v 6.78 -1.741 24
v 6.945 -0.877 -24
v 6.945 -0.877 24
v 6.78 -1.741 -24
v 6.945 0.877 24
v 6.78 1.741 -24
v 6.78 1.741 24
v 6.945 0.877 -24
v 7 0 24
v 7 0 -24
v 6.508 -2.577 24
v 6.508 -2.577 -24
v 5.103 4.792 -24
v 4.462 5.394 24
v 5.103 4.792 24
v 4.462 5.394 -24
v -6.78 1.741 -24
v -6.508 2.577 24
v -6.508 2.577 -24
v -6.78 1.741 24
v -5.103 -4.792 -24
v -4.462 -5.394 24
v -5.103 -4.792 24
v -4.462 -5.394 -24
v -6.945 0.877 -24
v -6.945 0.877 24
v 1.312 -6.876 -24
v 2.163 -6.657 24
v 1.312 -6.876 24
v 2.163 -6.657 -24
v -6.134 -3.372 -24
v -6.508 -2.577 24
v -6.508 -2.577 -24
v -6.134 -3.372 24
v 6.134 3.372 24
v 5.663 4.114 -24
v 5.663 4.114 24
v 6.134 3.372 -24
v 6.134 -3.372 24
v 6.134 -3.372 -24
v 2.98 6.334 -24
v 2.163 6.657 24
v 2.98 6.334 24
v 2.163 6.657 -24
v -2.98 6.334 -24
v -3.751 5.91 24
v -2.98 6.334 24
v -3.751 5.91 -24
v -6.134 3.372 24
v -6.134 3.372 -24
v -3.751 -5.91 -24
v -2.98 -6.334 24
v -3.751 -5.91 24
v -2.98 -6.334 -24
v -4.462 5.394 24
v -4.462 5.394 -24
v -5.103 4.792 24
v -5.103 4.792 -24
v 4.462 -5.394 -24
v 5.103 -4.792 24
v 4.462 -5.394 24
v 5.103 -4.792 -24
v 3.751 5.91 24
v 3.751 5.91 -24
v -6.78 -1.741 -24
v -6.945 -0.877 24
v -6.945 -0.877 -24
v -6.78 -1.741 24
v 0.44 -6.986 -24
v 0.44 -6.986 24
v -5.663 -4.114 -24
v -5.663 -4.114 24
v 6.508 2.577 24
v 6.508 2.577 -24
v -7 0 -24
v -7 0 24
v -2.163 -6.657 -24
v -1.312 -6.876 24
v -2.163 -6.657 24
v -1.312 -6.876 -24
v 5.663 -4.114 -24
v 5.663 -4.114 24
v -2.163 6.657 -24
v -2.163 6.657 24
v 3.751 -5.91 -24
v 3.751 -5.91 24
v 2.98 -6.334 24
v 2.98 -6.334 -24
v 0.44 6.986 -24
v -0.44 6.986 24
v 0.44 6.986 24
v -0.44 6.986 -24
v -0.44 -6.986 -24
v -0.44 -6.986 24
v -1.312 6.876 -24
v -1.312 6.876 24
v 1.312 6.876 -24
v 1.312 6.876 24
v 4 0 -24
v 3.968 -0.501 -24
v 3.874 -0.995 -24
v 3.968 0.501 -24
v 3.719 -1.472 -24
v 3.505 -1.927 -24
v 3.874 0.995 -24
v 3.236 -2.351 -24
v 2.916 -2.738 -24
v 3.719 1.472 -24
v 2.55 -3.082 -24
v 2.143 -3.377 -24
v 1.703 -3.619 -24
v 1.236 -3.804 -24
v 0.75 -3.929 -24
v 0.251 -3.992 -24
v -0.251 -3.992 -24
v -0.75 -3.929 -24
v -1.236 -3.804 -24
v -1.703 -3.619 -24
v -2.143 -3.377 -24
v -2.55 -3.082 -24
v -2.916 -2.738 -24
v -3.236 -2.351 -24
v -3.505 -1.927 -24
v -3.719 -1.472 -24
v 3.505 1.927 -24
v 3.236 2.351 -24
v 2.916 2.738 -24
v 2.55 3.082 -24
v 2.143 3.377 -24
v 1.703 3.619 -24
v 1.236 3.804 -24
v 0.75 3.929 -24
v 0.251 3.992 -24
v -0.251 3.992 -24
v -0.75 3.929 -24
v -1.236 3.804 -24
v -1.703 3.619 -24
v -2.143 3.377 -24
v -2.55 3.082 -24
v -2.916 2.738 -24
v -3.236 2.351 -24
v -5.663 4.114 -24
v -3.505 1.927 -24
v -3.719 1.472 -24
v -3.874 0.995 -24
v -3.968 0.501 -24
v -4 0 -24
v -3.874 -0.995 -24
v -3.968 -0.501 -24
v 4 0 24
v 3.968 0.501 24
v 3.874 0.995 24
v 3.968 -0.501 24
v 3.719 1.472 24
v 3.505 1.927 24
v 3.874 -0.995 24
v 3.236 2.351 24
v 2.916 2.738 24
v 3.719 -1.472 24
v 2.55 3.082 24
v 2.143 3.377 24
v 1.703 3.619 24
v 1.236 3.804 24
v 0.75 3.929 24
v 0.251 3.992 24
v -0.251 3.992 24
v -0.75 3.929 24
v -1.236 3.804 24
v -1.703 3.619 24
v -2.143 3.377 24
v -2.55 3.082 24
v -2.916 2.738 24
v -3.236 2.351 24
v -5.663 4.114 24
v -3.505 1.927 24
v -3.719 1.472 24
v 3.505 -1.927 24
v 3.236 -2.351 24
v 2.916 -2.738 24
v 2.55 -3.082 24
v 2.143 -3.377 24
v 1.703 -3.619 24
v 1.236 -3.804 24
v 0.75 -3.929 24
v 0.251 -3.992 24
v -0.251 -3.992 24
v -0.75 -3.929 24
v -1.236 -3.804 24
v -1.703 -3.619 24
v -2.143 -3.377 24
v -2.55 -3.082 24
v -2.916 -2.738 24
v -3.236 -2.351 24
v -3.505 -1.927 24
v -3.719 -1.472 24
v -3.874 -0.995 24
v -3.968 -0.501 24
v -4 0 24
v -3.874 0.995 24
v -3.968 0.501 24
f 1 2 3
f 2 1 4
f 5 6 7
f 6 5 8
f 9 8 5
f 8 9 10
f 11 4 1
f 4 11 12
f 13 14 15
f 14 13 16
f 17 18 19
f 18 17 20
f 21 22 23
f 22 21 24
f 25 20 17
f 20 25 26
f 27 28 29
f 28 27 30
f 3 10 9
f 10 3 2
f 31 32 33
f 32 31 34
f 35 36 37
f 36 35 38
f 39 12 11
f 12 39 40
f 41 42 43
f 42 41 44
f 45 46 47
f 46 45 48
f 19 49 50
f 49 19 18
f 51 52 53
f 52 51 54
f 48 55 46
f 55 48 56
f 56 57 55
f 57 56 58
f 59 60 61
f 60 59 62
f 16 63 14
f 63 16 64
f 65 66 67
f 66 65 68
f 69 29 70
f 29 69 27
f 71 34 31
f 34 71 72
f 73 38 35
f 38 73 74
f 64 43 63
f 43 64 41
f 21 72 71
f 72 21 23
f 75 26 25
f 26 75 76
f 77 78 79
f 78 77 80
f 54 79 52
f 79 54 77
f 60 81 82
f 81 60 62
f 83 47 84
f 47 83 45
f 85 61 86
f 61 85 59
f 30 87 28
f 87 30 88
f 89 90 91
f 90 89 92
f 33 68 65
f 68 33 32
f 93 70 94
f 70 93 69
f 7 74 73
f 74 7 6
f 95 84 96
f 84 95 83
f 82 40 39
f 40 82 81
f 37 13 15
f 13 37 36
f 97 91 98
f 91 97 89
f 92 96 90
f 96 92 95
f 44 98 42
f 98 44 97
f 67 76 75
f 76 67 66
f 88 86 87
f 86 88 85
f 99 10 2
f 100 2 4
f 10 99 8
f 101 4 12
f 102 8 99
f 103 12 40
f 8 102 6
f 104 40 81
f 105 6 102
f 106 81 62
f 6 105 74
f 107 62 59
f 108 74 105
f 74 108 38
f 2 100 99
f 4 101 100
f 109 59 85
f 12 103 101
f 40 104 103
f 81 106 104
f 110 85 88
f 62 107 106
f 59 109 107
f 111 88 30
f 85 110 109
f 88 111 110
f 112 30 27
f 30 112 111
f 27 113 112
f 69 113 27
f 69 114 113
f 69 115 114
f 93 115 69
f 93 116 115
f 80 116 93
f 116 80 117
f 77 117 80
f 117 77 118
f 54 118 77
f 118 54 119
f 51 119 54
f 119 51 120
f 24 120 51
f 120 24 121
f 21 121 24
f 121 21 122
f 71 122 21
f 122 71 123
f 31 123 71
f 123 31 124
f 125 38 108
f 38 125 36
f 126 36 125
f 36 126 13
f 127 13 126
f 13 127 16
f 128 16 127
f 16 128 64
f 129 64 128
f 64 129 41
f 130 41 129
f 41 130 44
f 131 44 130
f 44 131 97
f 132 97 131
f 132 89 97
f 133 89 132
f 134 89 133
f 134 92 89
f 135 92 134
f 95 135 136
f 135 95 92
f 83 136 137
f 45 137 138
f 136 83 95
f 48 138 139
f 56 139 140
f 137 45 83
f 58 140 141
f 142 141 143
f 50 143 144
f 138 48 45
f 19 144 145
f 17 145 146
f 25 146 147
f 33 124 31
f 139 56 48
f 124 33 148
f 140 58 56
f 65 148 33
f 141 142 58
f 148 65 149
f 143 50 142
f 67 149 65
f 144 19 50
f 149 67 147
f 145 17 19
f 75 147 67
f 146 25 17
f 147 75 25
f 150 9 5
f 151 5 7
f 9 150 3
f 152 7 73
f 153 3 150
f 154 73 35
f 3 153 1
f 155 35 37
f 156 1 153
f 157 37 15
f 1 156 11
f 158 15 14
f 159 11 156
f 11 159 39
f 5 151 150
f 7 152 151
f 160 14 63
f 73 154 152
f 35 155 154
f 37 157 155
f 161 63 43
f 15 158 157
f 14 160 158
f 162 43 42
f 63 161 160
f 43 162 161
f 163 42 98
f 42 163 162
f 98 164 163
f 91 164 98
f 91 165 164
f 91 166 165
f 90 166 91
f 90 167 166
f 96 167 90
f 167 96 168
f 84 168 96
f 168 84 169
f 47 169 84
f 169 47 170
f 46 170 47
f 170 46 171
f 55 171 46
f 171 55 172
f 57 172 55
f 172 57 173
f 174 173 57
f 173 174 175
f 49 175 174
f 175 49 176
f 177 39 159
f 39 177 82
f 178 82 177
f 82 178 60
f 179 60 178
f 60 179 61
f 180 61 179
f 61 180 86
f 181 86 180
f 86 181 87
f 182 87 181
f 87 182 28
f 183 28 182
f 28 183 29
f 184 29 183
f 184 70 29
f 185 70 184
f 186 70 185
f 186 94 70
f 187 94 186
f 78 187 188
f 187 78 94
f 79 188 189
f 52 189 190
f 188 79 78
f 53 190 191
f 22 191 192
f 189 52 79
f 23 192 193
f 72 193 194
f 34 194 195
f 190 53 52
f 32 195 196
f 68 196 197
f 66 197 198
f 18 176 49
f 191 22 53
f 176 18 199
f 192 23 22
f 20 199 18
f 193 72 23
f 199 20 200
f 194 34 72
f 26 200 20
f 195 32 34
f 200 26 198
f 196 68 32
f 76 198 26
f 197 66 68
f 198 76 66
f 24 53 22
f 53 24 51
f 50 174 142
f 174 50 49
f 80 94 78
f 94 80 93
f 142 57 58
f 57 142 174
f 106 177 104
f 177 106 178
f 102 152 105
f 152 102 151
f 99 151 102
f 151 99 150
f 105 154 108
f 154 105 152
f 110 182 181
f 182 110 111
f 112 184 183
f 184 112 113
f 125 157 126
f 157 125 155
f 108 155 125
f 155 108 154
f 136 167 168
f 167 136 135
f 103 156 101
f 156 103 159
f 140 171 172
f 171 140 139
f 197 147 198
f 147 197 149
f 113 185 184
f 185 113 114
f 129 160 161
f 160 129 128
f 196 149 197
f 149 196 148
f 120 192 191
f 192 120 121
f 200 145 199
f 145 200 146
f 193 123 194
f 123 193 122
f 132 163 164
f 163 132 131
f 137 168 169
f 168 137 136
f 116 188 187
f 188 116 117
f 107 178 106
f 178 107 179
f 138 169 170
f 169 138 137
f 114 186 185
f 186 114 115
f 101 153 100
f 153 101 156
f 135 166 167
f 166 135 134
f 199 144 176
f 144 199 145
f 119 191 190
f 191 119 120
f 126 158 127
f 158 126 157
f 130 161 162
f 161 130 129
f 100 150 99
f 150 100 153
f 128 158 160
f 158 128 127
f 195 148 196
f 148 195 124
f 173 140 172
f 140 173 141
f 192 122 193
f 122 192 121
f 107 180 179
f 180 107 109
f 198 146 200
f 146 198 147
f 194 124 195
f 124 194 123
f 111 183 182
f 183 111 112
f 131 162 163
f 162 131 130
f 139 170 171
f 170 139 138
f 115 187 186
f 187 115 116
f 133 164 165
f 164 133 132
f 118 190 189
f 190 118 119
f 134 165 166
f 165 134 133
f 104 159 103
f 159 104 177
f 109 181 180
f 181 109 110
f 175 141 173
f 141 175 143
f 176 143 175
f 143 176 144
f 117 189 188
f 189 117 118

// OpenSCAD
$fn = 50;


difference() {
	union() {
		translate(v = [0, 0, -24.0000000000]) {
			cylinder(h = 48, r = 7.0000000000);
		}
	}
	union() {
		translate(v = [0, 0, -100.0000000000]) {
			cylinder(h = 200, r = 4.0000000000);
		}
	}
}
